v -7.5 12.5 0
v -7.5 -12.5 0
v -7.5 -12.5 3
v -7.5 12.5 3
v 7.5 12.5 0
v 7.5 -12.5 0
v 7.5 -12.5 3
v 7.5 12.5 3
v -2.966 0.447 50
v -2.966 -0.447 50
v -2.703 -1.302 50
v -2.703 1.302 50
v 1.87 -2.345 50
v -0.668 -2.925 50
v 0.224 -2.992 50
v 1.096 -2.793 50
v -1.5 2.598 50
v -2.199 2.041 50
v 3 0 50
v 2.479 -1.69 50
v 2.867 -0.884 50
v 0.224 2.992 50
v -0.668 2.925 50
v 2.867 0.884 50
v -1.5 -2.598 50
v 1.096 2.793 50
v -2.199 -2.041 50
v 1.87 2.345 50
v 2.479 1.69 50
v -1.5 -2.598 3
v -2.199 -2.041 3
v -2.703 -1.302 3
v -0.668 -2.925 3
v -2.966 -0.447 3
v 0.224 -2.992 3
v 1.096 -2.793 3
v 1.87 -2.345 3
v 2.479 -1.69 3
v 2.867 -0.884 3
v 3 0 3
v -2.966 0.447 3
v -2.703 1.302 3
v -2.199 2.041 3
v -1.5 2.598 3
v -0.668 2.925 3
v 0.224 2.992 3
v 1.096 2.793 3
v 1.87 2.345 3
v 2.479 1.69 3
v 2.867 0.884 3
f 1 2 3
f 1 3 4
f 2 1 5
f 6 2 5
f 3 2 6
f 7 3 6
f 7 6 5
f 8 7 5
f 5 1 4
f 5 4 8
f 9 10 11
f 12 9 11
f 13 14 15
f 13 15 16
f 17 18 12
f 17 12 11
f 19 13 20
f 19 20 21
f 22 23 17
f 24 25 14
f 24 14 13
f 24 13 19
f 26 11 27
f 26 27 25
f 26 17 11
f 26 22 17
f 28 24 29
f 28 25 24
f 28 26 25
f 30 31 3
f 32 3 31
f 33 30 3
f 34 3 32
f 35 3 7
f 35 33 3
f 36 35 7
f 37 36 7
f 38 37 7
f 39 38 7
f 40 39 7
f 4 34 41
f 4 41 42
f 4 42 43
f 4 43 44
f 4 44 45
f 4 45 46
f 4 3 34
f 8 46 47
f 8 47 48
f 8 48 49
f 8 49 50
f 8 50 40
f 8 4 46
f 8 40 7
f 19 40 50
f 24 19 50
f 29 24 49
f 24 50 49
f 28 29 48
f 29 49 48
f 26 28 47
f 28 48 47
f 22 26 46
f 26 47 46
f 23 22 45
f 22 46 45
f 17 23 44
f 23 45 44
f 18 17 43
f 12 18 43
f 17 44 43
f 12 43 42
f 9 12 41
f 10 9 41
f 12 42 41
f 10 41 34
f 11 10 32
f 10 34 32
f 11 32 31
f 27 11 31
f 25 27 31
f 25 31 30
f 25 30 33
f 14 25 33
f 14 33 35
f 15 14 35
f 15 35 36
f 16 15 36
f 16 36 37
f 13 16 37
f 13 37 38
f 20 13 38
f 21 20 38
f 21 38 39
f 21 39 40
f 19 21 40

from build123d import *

# Parameters (mm, degrees)
F0_W     = 15
F0_H     = 25
F1_DEPTH = 3
F2_R     = 3
F3_DEPTH = 50


# Not quite as in the source:
# - a feature names something its author has since deleted; it is built from what else it names


with BuildPart() as f1:
    # F0 (on Top) → F1 (new body)
    with BuildSketch(Plane.XY):
        Rectangle(F0_W, F0_H)
    extrude(amount=F1_DEPTH)

    # F2 (on Top) → F3 (join)
    with BuildSketch(Plane.XY):
        Circle(F2_R)
    extrude(amount=F3_DEPTH)


solid = f1.part
